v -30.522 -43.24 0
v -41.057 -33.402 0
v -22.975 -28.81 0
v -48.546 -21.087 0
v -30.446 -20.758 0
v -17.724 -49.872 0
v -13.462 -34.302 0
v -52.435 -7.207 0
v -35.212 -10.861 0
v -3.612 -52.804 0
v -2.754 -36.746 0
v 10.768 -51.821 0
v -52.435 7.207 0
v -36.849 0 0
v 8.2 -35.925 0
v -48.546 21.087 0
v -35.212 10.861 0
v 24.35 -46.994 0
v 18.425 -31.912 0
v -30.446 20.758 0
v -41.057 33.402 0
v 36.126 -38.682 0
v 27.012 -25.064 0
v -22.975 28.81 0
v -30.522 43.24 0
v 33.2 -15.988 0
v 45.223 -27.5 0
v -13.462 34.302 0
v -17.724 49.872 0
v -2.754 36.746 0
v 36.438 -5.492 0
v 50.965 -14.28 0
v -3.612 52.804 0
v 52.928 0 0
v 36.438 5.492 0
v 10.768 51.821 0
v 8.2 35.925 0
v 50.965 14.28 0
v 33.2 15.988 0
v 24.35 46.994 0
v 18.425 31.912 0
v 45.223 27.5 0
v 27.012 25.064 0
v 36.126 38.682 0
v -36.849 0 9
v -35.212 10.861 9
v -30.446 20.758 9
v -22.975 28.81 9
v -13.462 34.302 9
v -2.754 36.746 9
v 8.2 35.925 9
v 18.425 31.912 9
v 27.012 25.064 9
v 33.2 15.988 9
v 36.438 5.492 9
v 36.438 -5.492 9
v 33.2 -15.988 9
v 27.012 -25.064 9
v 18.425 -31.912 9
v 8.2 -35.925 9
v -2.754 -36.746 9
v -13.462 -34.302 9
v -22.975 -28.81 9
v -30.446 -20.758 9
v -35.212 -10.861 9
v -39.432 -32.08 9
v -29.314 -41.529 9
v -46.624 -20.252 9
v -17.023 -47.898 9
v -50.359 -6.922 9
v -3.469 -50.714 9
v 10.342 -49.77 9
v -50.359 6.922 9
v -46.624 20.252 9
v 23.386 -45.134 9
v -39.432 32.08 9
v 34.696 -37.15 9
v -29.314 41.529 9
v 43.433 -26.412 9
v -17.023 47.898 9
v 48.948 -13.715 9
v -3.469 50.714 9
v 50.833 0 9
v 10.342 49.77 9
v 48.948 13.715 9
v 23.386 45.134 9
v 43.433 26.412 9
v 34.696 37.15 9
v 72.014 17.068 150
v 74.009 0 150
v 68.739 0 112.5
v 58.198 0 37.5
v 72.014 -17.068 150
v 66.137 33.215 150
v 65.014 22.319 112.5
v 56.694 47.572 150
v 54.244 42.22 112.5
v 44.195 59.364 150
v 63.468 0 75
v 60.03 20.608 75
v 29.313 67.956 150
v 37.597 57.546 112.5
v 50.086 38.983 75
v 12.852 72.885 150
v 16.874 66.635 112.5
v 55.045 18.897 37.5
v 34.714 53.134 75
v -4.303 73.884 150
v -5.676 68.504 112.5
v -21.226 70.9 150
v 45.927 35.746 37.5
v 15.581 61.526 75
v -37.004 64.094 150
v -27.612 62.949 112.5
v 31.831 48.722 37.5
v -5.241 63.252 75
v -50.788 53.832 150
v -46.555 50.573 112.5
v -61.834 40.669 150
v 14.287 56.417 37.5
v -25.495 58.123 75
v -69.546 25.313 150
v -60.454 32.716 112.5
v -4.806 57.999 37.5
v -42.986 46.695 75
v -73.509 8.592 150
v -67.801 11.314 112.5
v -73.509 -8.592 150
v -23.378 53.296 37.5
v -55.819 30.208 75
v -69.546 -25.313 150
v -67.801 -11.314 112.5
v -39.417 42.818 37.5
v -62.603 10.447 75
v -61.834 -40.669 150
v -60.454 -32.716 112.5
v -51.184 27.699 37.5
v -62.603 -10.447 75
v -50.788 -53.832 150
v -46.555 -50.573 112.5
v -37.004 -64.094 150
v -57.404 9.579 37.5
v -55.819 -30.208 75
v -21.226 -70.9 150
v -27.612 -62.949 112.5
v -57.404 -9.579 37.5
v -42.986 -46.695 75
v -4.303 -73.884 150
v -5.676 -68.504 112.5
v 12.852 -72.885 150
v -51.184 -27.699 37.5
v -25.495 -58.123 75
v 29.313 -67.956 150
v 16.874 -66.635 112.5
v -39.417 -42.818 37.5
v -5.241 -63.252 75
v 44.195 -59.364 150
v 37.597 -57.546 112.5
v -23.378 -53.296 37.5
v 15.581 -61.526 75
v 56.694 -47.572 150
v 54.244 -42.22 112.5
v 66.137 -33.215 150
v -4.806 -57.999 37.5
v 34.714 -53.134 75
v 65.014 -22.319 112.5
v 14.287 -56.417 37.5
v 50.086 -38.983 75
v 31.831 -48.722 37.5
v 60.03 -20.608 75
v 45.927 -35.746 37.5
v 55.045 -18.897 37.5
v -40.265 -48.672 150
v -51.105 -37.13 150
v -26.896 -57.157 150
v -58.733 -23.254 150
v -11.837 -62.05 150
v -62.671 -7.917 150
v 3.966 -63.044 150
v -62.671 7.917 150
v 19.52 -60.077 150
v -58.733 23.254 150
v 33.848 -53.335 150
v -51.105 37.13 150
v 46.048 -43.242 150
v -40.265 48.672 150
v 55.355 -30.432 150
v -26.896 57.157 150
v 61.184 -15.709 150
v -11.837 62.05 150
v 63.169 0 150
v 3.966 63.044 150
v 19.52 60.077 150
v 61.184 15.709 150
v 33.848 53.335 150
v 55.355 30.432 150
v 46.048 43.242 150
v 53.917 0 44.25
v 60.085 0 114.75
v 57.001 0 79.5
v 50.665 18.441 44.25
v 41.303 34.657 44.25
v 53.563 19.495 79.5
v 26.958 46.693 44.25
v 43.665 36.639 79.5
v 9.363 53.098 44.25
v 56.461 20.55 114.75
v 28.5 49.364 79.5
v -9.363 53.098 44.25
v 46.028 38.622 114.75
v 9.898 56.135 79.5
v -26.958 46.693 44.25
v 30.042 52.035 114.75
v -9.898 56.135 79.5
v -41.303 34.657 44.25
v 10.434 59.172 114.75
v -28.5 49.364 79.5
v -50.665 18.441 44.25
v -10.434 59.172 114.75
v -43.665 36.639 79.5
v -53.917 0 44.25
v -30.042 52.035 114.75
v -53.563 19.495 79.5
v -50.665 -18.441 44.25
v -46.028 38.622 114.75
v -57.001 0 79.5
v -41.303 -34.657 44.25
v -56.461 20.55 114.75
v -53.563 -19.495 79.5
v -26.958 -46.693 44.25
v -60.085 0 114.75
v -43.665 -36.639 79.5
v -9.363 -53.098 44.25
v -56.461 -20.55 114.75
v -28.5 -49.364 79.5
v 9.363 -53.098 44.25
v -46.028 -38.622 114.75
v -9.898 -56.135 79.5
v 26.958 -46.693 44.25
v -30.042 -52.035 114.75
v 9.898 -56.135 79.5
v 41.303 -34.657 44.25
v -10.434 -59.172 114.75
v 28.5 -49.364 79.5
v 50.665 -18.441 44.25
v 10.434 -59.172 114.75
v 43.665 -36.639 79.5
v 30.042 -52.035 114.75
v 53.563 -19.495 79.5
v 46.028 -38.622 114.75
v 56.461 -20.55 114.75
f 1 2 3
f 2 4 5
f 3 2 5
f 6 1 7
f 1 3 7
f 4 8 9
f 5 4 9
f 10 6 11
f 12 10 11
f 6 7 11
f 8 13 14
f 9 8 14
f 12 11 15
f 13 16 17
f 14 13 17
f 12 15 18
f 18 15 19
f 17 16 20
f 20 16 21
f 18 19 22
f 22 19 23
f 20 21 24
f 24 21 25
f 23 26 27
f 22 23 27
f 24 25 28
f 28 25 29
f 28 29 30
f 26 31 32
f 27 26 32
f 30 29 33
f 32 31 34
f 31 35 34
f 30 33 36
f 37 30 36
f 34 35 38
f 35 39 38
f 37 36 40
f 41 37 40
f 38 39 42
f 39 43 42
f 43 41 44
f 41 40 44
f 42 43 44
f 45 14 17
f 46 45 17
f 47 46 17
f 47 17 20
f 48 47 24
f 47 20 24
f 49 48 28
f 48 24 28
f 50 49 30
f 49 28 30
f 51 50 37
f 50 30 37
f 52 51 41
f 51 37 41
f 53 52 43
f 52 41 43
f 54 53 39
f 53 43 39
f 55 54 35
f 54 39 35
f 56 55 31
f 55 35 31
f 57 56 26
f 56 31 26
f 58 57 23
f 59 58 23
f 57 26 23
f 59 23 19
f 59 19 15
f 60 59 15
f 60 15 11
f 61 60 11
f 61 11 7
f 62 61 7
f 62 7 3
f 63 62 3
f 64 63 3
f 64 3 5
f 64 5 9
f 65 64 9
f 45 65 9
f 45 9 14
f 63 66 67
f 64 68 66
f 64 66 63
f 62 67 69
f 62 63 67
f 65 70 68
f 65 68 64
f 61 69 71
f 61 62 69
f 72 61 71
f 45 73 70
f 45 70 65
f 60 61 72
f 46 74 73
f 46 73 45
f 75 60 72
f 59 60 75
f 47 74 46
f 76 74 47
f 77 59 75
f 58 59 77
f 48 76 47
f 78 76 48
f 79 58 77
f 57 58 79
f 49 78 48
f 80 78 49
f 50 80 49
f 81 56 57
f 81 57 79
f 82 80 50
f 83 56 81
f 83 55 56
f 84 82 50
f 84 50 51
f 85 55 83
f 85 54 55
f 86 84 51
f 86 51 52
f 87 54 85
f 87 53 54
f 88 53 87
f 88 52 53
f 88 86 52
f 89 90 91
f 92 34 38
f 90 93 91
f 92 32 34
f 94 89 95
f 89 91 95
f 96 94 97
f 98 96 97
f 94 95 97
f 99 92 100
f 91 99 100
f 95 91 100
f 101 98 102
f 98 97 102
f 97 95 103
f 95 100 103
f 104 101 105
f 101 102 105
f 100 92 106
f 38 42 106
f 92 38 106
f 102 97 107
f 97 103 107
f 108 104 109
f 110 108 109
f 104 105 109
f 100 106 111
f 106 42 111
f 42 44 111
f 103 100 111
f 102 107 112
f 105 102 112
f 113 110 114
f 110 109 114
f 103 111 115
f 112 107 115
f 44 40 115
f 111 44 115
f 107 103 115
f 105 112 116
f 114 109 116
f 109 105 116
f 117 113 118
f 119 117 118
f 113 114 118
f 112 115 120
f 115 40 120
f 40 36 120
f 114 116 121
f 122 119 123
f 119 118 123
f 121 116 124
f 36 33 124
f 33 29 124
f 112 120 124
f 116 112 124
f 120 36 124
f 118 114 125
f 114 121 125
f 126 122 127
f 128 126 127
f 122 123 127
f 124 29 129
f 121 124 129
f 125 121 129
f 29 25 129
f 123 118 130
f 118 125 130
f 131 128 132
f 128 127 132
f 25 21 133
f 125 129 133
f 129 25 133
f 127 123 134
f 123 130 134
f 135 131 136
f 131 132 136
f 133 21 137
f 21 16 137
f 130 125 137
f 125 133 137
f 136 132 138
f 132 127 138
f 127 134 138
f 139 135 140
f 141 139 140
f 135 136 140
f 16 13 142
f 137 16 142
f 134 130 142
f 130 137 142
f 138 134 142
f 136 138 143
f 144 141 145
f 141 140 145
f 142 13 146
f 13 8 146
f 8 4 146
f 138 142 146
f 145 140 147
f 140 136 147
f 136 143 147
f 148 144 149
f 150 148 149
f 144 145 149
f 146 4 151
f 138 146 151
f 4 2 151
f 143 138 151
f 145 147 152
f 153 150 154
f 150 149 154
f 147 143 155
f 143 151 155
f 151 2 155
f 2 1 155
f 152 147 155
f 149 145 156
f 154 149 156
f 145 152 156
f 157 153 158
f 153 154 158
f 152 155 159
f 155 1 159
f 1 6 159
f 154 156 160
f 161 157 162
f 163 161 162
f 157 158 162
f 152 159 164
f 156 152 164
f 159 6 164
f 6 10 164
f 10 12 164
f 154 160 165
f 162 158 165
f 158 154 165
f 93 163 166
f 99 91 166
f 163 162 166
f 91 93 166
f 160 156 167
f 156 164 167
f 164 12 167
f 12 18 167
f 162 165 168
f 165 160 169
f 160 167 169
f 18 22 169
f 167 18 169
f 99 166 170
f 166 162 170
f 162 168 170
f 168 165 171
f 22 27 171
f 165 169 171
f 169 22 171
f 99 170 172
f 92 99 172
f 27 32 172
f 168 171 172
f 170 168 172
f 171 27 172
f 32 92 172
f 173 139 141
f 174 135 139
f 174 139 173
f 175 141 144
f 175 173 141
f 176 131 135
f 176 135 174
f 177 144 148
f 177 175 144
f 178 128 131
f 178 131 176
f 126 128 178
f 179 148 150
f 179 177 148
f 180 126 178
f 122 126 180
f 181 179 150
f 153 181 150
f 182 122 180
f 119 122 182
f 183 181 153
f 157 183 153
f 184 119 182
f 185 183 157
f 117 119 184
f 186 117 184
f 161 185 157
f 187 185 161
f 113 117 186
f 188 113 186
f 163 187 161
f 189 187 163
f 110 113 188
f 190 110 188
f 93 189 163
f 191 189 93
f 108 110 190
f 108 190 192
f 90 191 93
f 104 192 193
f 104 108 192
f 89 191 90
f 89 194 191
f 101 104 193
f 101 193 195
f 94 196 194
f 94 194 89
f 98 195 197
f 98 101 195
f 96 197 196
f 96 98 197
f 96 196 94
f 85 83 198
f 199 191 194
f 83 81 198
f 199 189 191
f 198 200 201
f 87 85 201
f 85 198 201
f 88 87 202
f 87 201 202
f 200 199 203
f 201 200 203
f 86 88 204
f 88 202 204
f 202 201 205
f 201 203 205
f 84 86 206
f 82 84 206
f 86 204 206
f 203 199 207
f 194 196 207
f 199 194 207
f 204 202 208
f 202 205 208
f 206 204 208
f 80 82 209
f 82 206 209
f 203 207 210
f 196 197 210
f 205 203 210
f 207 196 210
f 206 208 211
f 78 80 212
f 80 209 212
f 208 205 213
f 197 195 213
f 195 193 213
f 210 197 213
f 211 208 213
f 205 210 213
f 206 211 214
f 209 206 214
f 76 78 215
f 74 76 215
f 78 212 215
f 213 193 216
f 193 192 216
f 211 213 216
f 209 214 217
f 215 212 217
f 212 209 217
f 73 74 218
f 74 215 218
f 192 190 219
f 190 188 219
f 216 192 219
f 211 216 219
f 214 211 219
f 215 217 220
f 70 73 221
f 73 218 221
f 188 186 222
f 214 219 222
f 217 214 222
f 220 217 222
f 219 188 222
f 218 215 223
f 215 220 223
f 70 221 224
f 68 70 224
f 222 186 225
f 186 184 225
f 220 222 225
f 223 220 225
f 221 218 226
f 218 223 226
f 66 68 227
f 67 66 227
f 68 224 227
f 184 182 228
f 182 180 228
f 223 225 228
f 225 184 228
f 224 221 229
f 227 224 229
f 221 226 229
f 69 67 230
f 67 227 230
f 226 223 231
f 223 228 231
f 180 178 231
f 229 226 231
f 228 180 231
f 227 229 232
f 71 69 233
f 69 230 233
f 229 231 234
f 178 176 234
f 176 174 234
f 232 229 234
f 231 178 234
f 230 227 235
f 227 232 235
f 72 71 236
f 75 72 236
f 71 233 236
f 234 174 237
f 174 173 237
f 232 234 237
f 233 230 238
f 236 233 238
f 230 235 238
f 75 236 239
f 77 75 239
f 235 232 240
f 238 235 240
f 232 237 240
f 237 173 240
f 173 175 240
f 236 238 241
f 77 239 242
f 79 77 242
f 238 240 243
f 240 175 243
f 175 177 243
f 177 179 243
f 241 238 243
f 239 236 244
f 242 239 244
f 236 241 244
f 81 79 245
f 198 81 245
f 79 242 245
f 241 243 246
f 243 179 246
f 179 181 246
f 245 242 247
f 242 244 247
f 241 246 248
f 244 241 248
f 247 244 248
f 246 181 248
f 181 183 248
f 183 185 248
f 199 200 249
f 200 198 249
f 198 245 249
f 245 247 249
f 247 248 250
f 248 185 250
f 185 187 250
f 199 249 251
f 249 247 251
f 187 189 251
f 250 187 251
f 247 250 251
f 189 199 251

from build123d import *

# Parameters (mm, degrees)
SKETCH2_R           = 52.927862015
BOSS_EXTRUDE2_DEPTH = 150
BOSS_EXTRUDE2_DRAFT = -8
SKETCH6_R           = 36.849119173
CUT_EXTRUDE2_DEPTH  = 130
SKETCH8_R           = 63.168740943
CUT_EXTRUDE4_DEPTH  = 141
CUT_EXTRUDE4_DRAFT  = -5


with BuildPart() as part:
    # Sketch2 → Boss-Extrude2 (with draft: the straight prism first)
    with BuildSketch(Plane.XY):
        Circle(SKETCH2_R)
    extrude(amount=BOSS_EXTRUDE2_DEPTH)
    # Boss-Extrude2: the draft: its side faces are tilted about the plane it starts from
    boss_extrude2_sides = [part.faces().sort_by_distance(p)[0] for p in [
        (-52.927862015, 0, 75),
    ]]
    draft(boss_extrude2_sides, Plane.XY, BOSS_EXTRUDE2_DRAFT)

    # Sketch6 → Cut-Extrude2 (cut)
    with BuildSketch(Plane(origin=(0, 0, 0), x_dir=(-1, 0, 0), z_dir=(0, 0, -1))):
        Circle(SKETCH6_R)
    extrude(amount=-CUT_EXTRUDE2_DEPTH, mode=Mode.SUBTRACT)


with BuildPart() as cut_extrude4_tool:
    # Sketch8 → Cut-Extrude4 (with draft: the straight prism first)
    with BuildSketch(Plane.XY.offset(150)):
        Circle(SKETCH8_R)
    extrude(amount=-CUT_EXTRUDE4_DEPTH)
    # Cut-Extrude4: the draft: its side faces are tilted about the plane it starts from
    cut_extrude4_sides = [cut_extrude4_tool.faces().sort_by_distance(p)[0] for p in [
        (-63.168740943, 0, 79.5),
    ]]
    draft(cut_extrude4_sides, Plane.XY.offset(150), CUT_EXTRUDE4_DRAFT)


with BuildPart() as part_1:
    add(part.part)

    # Cut-Extrude4: cut by cut_extrude4_tool
    add(cut_extrude4_tool.part, mode=Mode.SUBTRACT)


solid = part_1.part
